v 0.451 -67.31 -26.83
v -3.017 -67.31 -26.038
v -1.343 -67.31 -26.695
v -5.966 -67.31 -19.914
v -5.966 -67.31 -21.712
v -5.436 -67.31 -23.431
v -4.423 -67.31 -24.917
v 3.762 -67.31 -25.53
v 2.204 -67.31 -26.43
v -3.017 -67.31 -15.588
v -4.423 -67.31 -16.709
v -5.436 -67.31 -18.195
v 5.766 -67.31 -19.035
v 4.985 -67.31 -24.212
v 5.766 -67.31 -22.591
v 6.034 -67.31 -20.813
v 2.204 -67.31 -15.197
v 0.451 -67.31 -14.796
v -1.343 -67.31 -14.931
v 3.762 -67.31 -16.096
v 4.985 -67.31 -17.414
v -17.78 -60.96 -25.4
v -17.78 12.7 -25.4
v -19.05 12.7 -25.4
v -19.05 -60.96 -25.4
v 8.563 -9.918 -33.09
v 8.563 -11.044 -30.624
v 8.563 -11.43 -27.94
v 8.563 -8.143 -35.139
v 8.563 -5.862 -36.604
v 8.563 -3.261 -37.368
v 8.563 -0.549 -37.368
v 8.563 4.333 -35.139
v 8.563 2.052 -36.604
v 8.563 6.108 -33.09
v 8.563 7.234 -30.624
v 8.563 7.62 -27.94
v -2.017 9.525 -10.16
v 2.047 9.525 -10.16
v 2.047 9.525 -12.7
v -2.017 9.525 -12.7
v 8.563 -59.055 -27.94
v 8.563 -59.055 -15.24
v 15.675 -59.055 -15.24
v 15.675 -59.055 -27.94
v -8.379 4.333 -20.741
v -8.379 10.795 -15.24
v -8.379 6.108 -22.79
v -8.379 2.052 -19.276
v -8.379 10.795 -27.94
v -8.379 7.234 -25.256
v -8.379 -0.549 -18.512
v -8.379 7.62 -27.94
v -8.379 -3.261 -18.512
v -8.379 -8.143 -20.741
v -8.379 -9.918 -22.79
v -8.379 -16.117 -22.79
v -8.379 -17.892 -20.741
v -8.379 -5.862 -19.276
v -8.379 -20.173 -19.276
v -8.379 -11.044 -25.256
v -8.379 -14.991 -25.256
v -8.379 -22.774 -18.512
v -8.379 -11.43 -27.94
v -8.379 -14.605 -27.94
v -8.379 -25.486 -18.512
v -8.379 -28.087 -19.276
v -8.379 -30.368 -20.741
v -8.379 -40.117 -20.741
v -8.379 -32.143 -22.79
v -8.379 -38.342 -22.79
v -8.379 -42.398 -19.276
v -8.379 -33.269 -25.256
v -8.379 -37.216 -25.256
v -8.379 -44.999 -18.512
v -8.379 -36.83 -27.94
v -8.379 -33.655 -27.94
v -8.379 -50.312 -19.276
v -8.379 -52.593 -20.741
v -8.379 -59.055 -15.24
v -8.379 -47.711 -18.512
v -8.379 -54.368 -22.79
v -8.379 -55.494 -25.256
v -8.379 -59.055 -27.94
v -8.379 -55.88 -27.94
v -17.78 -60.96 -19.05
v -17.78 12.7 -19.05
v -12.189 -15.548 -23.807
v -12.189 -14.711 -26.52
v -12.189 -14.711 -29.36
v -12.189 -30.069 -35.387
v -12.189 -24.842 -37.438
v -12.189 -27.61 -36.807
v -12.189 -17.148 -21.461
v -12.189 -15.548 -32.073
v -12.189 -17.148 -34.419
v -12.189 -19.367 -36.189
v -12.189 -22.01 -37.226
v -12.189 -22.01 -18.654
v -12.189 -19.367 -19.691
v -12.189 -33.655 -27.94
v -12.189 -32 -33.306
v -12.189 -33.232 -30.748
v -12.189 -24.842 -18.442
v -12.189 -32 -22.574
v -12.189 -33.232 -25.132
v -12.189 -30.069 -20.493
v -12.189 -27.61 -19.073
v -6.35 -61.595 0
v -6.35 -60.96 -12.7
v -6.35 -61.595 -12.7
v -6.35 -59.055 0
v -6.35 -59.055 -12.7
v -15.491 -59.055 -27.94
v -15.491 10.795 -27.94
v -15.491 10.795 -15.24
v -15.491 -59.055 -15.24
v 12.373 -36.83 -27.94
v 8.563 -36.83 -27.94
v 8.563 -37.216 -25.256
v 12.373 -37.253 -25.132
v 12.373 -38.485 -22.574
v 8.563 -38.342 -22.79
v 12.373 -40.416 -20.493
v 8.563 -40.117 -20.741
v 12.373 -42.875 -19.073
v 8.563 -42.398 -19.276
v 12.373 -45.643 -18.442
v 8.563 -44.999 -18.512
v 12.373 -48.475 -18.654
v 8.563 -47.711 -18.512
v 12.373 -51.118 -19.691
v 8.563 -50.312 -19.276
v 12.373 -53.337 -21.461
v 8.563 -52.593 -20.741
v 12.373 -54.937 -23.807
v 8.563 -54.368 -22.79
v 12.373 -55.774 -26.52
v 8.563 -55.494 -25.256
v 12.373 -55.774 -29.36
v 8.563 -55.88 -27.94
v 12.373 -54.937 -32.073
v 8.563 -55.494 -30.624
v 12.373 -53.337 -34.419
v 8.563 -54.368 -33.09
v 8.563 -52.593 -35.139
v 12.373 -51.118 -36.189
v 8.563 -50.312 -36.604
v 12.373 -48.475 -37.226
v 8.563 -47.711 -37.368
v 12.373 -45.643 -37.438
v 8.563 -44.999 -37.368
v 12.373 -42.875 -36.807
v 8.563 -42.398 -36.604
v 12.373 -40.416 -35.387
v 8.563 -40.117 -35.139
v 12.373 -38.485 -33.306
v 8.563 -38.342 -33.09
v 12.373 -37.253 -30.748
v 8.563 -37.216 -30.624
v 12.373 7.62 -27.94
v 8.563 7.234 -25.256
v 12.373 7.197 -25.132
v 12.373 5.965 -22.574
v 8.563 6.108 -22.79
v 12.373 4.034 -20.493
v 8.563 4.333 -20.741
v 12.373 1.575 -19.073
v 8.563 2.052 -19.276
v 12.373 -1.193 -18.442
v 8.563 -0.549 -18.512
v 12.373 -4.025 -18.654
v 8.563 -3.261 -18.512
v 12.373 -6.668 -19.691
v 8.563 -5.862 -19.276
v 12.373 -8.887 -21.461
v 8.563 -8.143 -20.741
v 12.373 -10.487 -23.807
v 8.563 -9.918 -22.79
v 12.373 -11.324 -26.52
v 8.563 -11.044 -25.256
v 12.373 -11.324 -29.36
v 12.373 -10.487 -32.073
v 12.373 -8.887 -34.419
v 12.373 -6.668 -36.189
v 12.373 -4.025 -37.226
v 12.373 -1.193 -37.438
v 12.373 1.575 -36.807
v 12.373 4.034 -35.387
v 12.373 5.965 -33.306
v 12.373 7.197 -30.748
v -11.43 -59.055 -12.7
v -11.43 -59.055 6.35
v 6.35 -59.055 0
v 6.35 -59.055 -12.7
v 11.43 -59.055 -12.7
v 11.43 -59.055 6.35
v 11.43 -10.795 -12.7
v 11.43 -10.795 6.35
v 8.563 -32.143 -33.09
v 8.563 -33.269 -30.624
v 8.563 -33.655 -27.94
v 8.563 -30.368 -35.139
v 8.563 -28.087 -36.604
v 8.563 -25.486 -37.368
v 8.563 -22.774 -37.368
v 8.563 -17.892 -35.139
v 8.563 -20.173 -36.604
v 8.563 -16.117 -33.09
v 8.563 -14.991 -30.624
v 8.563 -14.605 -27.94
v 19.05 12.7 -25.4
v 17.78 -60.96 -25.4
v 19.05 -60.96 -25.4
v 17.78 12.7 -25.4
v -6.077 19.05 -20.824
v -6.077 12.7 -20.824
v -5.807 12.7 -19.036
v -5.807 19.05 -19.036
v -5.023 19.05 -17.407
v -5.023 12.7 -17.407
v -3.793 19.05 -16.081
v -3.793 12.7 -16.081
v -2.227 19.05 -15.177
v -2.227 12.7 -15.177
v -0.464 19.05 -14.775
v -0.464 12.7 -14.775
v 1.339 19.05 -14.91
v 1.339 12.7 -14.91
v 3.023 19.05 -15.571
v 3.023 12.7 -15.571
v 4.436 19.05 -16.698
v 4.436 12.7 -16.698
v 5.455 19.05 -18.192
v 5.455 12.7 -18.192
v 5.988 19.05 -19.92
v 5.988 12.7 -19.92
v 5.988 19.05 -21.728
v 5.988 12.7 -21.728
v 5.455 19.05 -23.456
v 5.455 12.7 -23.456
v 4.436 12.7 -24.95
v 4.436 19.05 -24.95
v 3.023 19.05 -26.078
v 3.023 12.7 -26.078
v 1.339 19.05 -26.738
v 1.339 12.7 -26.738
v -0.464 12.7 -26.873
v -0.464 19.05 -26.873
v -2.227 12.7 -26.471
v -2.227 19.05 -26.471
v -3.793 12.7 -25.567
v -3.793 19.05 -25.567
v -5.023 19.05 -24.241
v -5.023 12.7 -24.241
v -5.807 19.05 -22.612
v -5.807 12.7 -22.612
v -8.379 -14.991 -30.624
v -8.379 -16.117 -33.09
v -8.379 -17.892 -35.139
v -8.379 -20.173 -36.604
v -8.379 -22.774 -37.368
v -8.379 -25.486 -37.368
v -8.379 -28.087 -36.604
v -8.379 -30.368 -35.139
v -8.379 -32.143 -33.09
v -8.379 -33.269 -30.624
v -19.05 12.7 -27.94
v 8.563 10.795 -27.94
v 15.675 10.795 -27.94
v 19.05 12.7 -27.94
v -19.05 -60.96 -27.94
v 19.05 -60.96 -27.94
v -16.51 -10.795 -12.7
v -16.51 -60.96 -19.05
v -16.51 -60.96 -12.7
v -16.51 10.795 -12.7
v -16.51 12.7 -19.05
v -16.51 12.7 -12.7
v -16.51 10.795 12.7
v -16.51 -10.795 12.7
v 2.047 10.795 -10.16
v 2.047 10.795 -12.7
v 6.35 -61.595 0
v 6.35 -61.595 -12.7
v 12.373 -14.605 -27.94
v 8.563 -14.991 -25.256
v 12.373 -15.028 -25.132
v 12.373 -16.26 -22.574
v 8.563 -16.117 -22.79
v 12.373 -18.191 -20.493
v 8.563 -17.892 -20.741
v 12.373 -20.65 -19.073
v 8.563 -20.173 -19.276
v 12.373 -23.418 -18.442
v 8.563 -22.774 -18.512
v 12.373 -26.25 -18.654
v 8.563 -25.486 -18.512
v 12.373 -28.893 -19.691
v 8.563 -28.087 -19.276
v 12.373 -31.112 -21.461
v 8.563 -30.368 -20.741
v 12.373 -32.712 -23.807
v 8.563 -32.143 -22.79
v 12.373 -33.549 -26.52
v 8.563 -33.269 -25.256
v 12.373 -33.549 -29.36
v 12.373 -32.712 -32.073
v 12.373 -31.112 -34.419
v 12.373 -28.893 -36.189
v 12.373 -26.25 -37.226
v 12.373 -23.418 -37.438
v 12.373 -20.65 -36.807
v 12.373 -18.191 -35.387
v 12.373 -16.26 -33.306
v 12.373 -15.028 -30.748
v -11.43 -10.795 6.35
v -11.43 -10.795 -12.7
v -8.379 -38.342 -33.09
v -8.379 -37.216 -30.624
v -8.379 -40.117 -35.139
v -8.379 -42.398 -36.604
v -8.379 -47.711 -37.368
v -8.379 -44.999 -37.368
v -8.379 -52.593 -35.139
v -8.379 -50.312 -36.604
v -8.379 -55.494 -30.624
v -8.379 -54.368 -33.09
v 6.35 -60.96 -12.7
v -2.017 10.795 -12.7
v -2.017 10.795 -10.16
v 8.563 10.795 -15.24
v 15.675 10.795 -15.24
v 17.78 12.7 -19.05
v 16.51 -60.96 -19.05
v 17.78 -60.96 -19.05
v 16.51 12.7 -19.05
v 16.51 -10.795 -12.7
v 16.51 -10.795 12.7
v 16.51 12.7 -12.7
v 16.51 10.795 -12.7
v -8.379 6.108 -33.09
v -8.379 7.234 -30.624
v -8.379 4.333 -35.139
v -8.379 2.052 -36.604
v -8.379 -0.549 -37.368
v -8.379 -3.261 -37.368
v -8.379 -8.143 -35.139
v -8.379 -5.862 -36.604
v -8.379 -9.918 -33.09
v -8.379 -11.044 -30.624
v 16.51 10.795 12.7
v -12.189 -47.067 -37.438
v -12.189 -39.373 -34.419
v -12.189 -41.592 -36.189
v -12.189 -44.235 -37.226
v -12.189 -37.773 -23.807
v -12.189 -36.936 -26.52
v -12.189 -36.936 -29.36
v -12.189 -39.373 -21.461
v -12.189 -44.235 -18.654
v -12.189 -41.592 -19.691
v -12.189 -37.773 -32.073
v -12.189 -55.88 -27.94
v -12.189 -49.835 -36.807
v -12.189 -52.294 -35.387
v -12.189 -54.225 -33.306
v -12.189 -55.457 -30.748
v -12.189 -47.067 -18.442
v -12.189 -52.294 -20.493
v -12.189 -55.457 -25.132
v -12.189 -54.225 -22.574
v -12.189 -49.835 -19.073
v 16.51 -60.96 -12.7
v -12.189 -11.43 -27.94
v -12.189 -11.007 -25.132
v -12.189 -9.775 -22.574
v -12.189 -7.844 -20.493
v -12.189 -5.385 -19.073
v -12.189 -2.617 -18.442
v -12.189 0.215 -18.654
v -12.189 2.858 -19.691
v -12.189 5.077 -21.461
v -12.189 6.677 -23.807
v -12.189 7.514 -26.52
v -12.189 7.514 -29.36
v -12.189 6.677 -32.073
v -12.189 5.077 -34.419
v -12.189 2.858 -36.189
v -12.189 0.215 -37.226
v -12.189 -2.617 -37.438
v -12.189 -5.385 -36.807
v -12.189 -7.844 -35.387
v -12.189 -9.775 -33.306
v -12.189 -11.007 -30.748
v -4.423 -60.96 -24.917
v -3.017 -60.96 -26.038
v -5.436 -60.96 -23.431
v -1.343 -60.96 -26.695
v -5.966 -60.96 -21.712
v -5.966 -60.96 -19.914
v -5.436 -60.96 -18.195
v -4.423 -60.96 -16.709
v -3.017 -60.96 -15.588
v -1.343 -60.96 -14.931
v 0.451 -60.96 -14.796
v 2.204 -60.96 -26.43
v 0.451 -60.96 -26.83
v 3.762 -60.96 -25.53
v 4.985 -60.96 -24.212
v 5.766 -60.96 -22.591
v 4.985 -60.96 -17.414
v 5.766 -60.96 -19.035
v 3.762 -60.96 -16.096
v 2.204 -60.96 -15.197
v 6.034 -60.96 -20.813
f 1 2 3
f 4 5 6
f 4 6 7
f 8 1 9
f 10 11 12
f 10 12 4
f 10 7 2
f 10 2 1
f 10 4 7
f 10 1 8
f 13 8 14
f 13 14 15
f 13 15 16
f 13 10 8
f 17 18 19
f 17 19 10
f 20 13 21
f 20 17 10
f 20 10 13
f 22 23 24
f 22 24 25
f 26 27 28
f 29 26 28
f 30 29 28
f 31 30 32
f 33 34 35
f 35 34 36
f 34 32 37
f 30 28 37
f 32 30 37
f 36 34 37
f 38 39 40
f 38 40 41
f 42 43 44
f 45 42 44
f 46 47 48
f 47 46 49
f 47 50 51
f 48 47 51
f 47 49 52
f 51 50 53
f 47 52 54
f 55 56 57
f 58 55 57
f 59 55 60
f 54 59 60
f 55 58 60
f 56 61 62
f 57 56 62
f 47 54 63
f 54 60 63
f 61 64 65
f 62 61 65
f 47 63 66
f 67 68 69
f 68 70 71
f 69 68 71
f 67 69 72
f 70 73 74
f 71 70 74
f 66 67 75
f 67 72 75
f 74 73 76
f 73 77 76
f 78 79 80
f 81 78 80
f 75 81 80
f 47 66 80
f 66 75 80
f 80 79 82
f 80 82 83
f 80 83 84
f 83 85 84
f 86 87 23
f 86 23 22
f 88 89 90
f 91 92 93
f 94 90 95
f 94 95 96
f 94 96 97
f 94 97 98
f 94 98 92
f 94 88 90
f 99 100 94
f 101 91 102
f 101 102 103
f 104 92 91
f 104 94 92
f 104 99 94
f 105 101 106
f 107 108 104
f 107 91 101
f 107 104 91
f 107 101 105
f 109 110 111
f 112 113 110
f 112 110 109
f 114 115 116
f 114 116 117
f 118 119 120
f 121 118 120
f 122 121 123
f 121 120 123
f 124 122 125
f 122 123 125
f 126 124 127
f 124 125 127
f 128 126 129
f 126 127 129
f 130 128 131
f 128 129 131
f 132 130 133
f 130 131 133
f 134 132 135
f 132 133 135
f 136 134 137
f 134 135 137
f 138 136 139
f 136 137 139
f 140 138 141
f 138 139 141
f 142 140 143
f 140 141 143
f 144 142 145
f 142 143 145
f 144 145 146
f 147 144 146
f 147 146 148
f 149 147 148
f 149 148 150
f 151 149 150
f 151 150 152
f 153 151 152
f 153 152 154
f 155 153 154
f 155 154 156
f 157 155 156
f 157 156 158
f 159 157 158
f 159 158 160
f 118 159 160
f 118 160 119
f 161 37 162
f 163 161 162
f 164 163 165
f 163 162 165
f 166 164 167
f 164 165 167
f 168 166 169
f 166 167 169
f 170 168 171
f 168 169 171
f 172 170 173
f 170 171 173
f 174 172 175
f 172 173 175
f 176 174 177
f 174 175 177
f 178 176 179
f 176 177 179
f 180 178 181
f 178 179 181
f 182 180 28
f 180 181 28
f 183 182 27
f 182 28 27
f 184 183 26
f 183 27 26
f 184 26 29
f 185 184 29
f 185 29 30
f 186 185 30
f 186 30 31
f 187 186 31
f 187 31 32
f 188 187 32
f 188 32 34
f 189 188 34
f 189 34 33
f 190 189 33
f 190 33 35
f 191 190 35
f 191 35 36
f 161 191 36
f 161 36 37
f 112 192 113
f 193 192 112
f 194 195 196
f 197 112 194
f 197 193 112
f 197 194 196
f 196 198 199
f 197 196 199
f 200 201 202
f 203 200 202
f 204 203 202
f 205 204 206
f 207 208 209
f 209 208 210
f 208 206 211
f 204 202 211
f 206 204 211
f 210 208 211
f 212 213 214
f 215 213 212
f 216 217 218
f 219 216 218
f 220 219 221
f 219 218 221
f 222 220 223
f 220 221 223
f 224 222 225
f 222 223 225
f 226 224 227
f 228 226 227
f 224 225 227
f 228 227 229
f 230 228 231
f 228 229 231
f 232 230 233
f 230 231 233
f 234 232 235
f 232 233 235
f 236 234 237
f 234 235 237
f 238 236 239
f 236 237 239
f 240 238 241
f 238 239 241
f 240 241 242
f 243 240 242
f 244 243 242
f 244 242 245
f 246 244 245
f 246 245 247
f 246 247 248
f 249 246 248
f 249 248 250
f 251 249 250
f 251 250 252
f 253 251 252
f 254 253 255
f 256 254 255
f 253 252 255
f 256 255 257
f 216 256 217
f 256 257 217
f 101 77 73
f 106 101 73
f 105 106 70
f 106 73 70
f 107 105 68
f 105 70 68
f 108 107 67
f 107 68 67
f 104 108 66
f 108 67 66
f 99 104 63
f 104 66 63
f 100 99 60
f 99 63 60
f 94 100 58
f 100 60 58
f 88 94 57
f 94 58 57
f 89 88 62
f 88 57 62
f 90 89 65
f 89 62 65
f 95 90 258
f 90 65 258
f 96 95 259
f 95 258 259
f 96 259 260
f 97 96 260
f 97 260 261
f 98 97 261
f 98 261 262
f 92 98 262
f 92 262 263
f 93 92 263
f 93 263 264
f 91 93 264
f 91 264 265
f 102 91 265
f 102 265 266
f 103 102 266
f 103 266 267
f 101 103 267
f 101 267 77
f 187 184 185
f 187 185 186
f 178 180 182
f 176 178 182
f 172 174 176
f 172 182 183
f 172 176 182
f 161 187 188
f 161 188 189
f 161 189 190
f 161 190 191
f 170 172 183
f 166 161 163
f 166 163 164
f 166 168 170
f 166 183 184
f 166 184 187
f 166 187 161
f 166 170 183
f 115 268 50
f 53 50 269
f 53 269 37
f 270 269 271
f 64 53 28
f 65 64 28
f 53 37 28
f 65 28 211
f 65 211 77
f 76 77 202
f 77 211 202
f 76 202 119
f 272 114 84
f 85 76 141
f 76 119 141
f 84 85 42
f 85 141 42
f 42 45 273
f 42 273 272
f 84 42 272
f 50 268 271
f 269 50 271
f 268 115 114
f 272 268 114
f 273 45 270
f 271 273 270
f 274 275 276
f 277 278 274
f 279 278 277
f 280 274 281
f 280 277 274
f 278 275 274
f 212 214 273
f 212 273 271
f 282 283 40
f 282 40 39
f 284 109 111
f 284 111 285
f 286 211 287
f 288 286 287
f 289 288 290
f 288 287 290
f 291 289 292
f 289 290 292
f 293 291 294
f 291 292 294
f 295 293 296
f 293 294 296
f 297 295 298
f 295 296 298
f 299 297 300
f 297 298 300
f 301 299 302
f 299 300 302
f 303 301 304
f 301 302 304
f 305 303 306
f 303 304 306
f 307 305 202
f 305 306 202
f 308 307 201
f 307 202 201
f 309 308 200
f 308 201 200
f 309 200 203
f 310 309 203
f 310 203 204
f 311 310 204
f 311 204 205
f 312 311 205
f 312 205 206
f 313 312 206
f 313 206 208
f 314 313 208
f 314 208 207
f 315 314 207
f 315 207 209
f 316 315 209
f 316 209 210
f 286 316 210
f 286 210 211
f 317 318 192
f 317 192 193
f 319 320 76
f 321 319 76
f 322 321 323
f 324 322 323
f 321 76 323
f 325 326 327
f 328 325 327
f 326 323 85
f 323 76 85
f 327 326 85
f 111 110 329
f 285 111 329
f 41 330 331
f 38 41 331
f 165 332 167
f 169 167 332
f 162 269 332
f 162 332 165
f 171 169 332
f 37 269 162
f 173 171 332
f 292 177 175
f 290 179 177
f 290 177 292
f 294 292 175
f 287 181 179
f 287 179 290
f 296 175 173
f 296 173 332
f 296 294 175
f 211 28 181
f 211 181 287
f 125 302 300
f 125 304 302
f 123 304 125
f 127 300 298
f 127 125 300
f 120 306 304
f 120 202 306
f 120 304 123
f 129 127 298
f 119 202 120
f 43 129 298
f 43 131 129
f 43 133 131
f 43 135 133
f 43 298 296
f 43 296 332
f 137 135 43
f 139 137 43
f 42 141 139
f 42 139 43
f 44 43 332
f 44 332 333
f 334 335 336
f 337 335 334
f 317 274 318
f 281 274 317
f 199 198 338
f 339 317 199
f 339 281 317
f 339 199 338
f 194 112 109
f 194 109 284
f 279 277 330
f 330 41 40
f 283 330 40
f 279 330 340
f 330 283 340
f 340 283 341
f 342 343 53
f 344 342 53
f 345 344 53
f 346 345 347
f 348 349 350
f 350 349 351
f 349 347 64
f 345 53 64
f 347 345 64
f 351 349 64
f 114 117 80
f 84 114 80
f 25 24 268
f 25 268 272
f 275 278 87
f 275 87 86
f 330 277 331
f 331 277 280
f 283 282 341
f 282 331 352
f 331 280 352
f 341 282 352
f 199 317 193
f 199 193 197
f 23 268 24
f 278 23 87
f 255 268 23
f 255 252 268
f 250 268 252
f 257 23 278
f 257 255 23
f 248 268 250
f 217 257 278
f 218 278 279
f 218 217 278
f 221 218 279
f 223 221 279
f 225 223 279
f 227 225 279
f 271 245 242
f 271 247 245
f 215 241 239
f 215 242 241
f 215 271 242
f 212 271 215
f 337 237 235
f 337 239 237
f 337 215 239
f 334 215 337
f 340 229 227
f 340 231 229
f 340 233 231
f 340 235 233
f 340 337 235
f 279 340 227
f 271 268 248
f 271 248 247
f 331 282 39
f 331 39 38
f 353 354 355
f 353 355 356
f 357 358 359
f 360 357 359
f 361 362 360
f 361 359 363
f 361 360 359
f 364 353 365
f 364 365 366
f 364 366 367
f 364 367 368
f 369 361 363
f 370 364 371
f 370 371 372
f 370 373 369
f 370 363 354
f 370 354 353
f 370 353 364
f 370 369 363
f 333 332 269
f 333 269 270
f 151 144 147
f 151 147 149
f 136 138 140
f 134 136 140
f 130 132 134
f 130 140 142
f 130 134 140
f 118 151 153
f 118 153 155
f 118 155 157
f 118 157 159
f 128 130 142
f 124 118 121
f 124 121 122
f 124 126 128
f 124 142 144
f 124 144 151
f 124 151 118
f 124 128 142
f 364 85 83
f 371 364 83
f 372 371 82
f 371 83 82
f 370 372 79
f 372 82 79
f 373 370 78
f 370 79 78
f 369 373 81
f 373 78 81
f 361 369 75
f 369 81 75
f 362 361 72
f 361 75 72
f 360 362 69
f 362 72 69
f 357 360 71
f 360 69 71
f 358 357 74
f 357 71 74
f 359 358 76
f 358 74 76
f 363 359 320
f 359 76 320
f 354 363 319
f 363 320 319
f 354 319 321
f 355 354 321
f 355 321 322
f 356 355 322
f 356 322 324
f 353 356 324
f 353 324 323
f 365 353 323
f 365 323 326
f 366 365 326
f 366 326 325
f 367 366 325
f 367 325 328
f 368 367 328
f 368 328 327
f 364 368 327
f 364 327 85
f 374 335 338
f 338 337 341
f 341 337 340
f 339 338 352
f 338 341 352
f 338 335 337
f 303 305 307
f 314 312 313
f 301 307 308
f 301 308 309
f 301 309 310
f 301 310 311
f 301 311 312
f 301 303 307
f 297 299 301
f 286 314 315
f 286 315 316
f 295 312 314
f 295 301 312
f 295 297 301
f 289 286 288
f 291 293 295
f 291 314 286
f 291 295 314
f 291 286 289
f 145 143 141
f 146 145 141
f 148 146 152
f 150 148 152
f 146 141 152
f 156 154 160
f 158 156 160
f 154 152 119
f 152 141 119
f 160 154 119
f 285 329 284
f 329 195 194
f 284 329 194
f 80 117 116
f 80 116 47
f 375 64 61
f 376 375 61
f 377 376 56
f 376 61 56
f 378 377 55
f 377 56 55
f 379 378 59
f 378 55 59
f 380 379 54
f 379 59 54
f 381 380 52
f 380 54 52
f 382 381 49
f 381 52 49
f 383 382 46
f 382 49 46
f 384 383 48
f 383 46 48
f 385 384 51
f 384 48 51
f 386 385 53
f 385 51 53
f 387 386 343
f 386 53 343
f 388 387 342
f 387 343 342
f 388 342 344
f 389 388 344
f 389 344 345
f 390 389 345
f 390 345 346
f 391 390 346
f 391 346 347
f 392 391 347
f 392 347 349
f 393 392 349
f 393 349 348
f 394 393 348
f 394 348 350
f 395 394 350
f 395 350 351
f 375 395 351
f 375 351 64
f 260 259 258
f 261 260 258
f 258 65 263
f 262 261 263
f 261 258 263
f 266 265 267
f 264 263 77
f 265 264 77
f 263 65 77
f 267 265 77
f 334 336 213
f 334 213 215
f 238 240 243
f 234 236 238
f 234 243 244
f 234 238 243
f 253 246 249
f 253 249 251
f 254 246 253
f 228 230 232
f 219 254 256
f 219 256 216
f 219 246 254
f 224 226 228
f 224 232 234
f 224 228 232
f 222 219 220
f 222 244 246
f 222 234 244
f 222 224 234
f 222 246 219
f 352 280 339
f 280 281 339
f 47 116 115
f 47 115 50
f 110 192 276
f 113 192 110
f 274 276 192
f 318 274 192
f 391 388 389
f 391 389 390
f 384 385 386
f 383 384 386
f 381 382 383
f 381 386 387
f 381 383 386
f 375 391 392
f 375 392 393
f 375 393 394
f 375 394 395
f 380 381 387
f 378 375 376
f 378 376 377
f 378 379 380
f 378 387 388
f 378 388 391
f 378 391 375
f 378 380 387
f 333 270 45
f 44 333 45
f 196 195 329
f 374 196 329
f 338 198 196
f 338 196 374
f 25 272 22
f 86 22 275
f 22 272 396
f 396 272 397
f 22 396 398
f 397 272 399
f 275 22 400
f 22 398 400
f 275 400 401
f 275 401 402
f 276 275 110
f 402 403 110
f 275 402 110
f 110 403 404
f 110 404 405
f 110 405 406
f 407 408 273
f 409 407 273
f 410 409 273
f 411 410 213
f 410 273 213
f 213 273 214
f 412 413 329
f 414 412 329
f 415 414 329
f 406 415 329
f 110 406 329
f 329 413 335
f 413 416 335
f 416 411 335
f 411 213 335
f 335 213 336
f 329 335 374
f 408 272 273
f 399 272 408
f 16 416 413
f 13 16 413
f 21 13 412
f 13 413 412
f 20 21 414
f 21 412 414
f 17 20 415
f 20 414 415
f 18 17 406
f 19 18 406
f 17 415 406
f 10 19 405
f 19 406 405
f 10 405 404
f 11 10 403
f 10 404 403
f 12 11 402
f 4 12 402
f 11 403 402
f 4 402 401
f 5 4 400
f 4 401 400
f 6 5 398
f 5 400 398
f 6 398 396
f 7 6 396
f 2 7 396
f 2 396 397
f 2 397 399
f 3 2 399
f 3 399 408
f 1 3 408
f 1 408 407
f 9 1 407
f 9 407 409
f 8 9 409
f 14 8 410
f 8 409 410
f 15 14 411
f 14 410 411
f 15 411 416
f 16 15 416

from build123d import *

# Parameters (mm, degrees)
F0_W      = 33.02
F0_H      = 25.4
F1_DEPTH  = 10.795
F2_W      = 22.86
F2_H      = 19.05
F3_DEPTH  = 48.26
F4_W      = 33.02
F4_H      = 15.24
F5_DEPTH  = 12.7
F6_W      = 33.02
F6_H      = 15.24
F7_DEPTH  = 48.26
F8_W      = 12.7
F8_H      = 12.7
F9_DEPTH  = 2.54
F10_W     = 7.112
F10_H     = 69.85
F11_DEPTH = 12.7
F13_R     = 6.033573
F14_DEPTH = 6.35
F12_R     = 9.525
F15_DEPTH = 3.81
F16_R     = 9.525
F17_DEPTH = 3.81
F18_R     = 9.525
F19_DEPTH = 3.81
F20_R     = 9.525
F21_DEPTH = 3.81
F22_R     = 9.525
F23_DEPTH = 3.81
F24_R     = 9.525
F25_DEPTH = 3.81
F26_R     = 6.066137
F27_DEPTH = 6.35
F28_W     = 73.66
F28_H     = 8.89
F29_DEPTH = 1.27
F30_W     = 73.66
F30_H     = 8.89
F31_DEPTH = 1.27
F32_W     = 73.66
F32_H     = 2.54
F33_DEPTH = 1.27
F34_W     = 73.66
F34_H     = 2.54
F35_DEPTH = 1.27
F36_W     = 4.064
F36_H     = 2.54
F37_DEPTH = 1.27


with BuildPart() as f1:
    # F0 (on Front) → F1 (new body, symmetric)
    with BuildSketch(Plane.XZ):
        Rectangle(F0_W, F0_H)
    extrude(amount=F1_DEPTH, both=True)

    # F2 (on face) → F3 (join)
    with BuildSketch(Plane.XZ.offset(10.795)):
        with Locations((0, -3.175)):
            Rectangle(F2_W, F2_H)
    extrude(amount=F3_DEPTH)

    # F4 (on Front) → F5 (join, symmetric)
    with BuildSketch(Plane.XZ):
        with Locations((0, -20.32)):
            Rectangle(F4_W, F4_H)
    extrude(amount=F5_DEPTH, both=True)

    # F6 (on face) → F7 (join)
    with BuildSketch(Plane.XZ.offset(12.7)):
        with Locations((0, -20.32)):
            Rectangle(F6_W, F6_H)
    extrude(amount=F7_DEPTH)

    # F8 (on face) → F9 (join)
    with BuildSketch(Plane.XZ.offset(59.055)):
        with Locations((0, -6.35)):
            Rectangle(F8_W, F8_H)
    extrude(amount=F9_DEPTH)

    # F10 (on face) → F11 (cut)
    with BuildSketch(Plane(origin=(0, 0, -27.94), x_dir=(1, 0, 0), z_dir=(0, 0, -1))):
        with Locations((-11.934741, 24.13)):
            Rectangle(F10_W, F10_H)
        with Locations((12.118584, 24.13)):
            Rectangle(F10_W, F10_H)
    extrude(amount=-F11_DEPTH, mode=Mode.SUBTRACT)

    # F13 (on face) → F14 (join)
    with BuildSketch(Plane.XZ.offset(60.96)):
        with Locations((0, -20.813061)):
            Circle(F13_R)
    extrude(amount=F14_DEPTH)

    # F12 (on face) → F15 (join)
    with BuildSketch(Plane(origin=(-8.378741, 0, 0), x_dir=(0, -1, 0), z_dir=(-1, 0, 0))):
        with Locations((24.13, -27.94)):
            Circle(F12_R)
    extrude(amount=F15_DEPTH)

    # F16 (on face) → F17 (join)
    with BuildSketch(Plane(origin=(-8.378741, 0, 0), x_dir=(0, -1, 0), z_dir=(-1, 0, 0))):
        with Locations((46.355, -27.94)):
            Circle(F16_R)
    extrude(amount=F17_DEPTH)

    # F18 (on face) → F19 (join)
    with BuildSketch(Plane(origin=(-8.378741, 0, 0), x_dir=(0, -1, 0), z_dir=(-1, 0, 0))):
        with Locations((1.905, -27.94)):
            Circle(F18_R)
    extrude(amount=F19_DEPTH)

    # F20 (on face) → F21 (join)
    with BuildSketch(Plane.YZ.offset(8.562584)):
        with Locations((-24.13, -27.94)):
            Circle(F20_R)
    extrude(amount=F21_DEPTH)

    # F22 (on face) → F23 (join)
    with BuildSketch(Plane.YZ.offset(8.562584)):
        with Locations((-1.905, -27.94)):
            Circle(F22_R)
    extrude(amount=F23_DEPTH)

    # F24 (on face) → F25 (join)
    with BuildSketch(Plane.YZ.offset(8.562584)):
        with Locations((-46.355, -27.94)):
            Circle(F24_R)
    extrude(amount=F25_DEPTH)

    # F26 (on face) → F27 (join)
    with BuildSketch(Plane(origin=(0, 12.7, 0), x_dir=(-1, 0, 0), z_dir=(0, 1, 0))):
        with Locations((0.010551, -20.824138)):
            Circle(F26_R)
    extrude(amount=F27_DEPTH)

    # F28 (on face) → F29 (join)
    with BuildSketch(Plane.YZ.offset(16.51)):
        with Locations((-24.13, -23.495)):
            Rectangle(F28_W, F28_H)
    extrude(amount=F29_DEPTH)

    # F30 (on face) → F31 (join)
    with BuildSketch(Plane(origin=(-16.51, 0, 0), x_dir=(0, -1, 0), z_dir=(-1, 0, 0))):
        with Locations((24.13, -23.495)):
            Rectangle(F30_W, F30_H)
    extrude(amount=F31_DEPTH)

    # F32 (on face) → F33 (join)
    with BuildSketch(Plane.YZ.offset(17.78)):
        with Locations((-24.13, -26.67)):
            Rectangle(F32_W, F32_H)
    extrude(amount=F33_DEPTH)

    # F34 (on face) → F35 (join)
    with BuildSketch(Plane(origin=(-17.78, 0, 0), x_dir=(0, -1, 0), z_dir=(-1, 0, 0))):
        with Locations((24.13, -26.67)):
            Rectangle(F34_W, F34_H)
    extrude(amount=F35_DEPTH)

    # F36 (on face) → F37 (cut)
    with BuildSketch(Plane(origin=(0, 10.795, 0), x_dir=(-1, 0, 0), z_dir=(0, 1, 0))):
        with Locations((-0.015461, -11.43)):
            Rectangle(F36_W, F36_H)
    extrude(amount=-F37_DEPTH, mode=Mode.SUBTRACT)


solid = f1.part
